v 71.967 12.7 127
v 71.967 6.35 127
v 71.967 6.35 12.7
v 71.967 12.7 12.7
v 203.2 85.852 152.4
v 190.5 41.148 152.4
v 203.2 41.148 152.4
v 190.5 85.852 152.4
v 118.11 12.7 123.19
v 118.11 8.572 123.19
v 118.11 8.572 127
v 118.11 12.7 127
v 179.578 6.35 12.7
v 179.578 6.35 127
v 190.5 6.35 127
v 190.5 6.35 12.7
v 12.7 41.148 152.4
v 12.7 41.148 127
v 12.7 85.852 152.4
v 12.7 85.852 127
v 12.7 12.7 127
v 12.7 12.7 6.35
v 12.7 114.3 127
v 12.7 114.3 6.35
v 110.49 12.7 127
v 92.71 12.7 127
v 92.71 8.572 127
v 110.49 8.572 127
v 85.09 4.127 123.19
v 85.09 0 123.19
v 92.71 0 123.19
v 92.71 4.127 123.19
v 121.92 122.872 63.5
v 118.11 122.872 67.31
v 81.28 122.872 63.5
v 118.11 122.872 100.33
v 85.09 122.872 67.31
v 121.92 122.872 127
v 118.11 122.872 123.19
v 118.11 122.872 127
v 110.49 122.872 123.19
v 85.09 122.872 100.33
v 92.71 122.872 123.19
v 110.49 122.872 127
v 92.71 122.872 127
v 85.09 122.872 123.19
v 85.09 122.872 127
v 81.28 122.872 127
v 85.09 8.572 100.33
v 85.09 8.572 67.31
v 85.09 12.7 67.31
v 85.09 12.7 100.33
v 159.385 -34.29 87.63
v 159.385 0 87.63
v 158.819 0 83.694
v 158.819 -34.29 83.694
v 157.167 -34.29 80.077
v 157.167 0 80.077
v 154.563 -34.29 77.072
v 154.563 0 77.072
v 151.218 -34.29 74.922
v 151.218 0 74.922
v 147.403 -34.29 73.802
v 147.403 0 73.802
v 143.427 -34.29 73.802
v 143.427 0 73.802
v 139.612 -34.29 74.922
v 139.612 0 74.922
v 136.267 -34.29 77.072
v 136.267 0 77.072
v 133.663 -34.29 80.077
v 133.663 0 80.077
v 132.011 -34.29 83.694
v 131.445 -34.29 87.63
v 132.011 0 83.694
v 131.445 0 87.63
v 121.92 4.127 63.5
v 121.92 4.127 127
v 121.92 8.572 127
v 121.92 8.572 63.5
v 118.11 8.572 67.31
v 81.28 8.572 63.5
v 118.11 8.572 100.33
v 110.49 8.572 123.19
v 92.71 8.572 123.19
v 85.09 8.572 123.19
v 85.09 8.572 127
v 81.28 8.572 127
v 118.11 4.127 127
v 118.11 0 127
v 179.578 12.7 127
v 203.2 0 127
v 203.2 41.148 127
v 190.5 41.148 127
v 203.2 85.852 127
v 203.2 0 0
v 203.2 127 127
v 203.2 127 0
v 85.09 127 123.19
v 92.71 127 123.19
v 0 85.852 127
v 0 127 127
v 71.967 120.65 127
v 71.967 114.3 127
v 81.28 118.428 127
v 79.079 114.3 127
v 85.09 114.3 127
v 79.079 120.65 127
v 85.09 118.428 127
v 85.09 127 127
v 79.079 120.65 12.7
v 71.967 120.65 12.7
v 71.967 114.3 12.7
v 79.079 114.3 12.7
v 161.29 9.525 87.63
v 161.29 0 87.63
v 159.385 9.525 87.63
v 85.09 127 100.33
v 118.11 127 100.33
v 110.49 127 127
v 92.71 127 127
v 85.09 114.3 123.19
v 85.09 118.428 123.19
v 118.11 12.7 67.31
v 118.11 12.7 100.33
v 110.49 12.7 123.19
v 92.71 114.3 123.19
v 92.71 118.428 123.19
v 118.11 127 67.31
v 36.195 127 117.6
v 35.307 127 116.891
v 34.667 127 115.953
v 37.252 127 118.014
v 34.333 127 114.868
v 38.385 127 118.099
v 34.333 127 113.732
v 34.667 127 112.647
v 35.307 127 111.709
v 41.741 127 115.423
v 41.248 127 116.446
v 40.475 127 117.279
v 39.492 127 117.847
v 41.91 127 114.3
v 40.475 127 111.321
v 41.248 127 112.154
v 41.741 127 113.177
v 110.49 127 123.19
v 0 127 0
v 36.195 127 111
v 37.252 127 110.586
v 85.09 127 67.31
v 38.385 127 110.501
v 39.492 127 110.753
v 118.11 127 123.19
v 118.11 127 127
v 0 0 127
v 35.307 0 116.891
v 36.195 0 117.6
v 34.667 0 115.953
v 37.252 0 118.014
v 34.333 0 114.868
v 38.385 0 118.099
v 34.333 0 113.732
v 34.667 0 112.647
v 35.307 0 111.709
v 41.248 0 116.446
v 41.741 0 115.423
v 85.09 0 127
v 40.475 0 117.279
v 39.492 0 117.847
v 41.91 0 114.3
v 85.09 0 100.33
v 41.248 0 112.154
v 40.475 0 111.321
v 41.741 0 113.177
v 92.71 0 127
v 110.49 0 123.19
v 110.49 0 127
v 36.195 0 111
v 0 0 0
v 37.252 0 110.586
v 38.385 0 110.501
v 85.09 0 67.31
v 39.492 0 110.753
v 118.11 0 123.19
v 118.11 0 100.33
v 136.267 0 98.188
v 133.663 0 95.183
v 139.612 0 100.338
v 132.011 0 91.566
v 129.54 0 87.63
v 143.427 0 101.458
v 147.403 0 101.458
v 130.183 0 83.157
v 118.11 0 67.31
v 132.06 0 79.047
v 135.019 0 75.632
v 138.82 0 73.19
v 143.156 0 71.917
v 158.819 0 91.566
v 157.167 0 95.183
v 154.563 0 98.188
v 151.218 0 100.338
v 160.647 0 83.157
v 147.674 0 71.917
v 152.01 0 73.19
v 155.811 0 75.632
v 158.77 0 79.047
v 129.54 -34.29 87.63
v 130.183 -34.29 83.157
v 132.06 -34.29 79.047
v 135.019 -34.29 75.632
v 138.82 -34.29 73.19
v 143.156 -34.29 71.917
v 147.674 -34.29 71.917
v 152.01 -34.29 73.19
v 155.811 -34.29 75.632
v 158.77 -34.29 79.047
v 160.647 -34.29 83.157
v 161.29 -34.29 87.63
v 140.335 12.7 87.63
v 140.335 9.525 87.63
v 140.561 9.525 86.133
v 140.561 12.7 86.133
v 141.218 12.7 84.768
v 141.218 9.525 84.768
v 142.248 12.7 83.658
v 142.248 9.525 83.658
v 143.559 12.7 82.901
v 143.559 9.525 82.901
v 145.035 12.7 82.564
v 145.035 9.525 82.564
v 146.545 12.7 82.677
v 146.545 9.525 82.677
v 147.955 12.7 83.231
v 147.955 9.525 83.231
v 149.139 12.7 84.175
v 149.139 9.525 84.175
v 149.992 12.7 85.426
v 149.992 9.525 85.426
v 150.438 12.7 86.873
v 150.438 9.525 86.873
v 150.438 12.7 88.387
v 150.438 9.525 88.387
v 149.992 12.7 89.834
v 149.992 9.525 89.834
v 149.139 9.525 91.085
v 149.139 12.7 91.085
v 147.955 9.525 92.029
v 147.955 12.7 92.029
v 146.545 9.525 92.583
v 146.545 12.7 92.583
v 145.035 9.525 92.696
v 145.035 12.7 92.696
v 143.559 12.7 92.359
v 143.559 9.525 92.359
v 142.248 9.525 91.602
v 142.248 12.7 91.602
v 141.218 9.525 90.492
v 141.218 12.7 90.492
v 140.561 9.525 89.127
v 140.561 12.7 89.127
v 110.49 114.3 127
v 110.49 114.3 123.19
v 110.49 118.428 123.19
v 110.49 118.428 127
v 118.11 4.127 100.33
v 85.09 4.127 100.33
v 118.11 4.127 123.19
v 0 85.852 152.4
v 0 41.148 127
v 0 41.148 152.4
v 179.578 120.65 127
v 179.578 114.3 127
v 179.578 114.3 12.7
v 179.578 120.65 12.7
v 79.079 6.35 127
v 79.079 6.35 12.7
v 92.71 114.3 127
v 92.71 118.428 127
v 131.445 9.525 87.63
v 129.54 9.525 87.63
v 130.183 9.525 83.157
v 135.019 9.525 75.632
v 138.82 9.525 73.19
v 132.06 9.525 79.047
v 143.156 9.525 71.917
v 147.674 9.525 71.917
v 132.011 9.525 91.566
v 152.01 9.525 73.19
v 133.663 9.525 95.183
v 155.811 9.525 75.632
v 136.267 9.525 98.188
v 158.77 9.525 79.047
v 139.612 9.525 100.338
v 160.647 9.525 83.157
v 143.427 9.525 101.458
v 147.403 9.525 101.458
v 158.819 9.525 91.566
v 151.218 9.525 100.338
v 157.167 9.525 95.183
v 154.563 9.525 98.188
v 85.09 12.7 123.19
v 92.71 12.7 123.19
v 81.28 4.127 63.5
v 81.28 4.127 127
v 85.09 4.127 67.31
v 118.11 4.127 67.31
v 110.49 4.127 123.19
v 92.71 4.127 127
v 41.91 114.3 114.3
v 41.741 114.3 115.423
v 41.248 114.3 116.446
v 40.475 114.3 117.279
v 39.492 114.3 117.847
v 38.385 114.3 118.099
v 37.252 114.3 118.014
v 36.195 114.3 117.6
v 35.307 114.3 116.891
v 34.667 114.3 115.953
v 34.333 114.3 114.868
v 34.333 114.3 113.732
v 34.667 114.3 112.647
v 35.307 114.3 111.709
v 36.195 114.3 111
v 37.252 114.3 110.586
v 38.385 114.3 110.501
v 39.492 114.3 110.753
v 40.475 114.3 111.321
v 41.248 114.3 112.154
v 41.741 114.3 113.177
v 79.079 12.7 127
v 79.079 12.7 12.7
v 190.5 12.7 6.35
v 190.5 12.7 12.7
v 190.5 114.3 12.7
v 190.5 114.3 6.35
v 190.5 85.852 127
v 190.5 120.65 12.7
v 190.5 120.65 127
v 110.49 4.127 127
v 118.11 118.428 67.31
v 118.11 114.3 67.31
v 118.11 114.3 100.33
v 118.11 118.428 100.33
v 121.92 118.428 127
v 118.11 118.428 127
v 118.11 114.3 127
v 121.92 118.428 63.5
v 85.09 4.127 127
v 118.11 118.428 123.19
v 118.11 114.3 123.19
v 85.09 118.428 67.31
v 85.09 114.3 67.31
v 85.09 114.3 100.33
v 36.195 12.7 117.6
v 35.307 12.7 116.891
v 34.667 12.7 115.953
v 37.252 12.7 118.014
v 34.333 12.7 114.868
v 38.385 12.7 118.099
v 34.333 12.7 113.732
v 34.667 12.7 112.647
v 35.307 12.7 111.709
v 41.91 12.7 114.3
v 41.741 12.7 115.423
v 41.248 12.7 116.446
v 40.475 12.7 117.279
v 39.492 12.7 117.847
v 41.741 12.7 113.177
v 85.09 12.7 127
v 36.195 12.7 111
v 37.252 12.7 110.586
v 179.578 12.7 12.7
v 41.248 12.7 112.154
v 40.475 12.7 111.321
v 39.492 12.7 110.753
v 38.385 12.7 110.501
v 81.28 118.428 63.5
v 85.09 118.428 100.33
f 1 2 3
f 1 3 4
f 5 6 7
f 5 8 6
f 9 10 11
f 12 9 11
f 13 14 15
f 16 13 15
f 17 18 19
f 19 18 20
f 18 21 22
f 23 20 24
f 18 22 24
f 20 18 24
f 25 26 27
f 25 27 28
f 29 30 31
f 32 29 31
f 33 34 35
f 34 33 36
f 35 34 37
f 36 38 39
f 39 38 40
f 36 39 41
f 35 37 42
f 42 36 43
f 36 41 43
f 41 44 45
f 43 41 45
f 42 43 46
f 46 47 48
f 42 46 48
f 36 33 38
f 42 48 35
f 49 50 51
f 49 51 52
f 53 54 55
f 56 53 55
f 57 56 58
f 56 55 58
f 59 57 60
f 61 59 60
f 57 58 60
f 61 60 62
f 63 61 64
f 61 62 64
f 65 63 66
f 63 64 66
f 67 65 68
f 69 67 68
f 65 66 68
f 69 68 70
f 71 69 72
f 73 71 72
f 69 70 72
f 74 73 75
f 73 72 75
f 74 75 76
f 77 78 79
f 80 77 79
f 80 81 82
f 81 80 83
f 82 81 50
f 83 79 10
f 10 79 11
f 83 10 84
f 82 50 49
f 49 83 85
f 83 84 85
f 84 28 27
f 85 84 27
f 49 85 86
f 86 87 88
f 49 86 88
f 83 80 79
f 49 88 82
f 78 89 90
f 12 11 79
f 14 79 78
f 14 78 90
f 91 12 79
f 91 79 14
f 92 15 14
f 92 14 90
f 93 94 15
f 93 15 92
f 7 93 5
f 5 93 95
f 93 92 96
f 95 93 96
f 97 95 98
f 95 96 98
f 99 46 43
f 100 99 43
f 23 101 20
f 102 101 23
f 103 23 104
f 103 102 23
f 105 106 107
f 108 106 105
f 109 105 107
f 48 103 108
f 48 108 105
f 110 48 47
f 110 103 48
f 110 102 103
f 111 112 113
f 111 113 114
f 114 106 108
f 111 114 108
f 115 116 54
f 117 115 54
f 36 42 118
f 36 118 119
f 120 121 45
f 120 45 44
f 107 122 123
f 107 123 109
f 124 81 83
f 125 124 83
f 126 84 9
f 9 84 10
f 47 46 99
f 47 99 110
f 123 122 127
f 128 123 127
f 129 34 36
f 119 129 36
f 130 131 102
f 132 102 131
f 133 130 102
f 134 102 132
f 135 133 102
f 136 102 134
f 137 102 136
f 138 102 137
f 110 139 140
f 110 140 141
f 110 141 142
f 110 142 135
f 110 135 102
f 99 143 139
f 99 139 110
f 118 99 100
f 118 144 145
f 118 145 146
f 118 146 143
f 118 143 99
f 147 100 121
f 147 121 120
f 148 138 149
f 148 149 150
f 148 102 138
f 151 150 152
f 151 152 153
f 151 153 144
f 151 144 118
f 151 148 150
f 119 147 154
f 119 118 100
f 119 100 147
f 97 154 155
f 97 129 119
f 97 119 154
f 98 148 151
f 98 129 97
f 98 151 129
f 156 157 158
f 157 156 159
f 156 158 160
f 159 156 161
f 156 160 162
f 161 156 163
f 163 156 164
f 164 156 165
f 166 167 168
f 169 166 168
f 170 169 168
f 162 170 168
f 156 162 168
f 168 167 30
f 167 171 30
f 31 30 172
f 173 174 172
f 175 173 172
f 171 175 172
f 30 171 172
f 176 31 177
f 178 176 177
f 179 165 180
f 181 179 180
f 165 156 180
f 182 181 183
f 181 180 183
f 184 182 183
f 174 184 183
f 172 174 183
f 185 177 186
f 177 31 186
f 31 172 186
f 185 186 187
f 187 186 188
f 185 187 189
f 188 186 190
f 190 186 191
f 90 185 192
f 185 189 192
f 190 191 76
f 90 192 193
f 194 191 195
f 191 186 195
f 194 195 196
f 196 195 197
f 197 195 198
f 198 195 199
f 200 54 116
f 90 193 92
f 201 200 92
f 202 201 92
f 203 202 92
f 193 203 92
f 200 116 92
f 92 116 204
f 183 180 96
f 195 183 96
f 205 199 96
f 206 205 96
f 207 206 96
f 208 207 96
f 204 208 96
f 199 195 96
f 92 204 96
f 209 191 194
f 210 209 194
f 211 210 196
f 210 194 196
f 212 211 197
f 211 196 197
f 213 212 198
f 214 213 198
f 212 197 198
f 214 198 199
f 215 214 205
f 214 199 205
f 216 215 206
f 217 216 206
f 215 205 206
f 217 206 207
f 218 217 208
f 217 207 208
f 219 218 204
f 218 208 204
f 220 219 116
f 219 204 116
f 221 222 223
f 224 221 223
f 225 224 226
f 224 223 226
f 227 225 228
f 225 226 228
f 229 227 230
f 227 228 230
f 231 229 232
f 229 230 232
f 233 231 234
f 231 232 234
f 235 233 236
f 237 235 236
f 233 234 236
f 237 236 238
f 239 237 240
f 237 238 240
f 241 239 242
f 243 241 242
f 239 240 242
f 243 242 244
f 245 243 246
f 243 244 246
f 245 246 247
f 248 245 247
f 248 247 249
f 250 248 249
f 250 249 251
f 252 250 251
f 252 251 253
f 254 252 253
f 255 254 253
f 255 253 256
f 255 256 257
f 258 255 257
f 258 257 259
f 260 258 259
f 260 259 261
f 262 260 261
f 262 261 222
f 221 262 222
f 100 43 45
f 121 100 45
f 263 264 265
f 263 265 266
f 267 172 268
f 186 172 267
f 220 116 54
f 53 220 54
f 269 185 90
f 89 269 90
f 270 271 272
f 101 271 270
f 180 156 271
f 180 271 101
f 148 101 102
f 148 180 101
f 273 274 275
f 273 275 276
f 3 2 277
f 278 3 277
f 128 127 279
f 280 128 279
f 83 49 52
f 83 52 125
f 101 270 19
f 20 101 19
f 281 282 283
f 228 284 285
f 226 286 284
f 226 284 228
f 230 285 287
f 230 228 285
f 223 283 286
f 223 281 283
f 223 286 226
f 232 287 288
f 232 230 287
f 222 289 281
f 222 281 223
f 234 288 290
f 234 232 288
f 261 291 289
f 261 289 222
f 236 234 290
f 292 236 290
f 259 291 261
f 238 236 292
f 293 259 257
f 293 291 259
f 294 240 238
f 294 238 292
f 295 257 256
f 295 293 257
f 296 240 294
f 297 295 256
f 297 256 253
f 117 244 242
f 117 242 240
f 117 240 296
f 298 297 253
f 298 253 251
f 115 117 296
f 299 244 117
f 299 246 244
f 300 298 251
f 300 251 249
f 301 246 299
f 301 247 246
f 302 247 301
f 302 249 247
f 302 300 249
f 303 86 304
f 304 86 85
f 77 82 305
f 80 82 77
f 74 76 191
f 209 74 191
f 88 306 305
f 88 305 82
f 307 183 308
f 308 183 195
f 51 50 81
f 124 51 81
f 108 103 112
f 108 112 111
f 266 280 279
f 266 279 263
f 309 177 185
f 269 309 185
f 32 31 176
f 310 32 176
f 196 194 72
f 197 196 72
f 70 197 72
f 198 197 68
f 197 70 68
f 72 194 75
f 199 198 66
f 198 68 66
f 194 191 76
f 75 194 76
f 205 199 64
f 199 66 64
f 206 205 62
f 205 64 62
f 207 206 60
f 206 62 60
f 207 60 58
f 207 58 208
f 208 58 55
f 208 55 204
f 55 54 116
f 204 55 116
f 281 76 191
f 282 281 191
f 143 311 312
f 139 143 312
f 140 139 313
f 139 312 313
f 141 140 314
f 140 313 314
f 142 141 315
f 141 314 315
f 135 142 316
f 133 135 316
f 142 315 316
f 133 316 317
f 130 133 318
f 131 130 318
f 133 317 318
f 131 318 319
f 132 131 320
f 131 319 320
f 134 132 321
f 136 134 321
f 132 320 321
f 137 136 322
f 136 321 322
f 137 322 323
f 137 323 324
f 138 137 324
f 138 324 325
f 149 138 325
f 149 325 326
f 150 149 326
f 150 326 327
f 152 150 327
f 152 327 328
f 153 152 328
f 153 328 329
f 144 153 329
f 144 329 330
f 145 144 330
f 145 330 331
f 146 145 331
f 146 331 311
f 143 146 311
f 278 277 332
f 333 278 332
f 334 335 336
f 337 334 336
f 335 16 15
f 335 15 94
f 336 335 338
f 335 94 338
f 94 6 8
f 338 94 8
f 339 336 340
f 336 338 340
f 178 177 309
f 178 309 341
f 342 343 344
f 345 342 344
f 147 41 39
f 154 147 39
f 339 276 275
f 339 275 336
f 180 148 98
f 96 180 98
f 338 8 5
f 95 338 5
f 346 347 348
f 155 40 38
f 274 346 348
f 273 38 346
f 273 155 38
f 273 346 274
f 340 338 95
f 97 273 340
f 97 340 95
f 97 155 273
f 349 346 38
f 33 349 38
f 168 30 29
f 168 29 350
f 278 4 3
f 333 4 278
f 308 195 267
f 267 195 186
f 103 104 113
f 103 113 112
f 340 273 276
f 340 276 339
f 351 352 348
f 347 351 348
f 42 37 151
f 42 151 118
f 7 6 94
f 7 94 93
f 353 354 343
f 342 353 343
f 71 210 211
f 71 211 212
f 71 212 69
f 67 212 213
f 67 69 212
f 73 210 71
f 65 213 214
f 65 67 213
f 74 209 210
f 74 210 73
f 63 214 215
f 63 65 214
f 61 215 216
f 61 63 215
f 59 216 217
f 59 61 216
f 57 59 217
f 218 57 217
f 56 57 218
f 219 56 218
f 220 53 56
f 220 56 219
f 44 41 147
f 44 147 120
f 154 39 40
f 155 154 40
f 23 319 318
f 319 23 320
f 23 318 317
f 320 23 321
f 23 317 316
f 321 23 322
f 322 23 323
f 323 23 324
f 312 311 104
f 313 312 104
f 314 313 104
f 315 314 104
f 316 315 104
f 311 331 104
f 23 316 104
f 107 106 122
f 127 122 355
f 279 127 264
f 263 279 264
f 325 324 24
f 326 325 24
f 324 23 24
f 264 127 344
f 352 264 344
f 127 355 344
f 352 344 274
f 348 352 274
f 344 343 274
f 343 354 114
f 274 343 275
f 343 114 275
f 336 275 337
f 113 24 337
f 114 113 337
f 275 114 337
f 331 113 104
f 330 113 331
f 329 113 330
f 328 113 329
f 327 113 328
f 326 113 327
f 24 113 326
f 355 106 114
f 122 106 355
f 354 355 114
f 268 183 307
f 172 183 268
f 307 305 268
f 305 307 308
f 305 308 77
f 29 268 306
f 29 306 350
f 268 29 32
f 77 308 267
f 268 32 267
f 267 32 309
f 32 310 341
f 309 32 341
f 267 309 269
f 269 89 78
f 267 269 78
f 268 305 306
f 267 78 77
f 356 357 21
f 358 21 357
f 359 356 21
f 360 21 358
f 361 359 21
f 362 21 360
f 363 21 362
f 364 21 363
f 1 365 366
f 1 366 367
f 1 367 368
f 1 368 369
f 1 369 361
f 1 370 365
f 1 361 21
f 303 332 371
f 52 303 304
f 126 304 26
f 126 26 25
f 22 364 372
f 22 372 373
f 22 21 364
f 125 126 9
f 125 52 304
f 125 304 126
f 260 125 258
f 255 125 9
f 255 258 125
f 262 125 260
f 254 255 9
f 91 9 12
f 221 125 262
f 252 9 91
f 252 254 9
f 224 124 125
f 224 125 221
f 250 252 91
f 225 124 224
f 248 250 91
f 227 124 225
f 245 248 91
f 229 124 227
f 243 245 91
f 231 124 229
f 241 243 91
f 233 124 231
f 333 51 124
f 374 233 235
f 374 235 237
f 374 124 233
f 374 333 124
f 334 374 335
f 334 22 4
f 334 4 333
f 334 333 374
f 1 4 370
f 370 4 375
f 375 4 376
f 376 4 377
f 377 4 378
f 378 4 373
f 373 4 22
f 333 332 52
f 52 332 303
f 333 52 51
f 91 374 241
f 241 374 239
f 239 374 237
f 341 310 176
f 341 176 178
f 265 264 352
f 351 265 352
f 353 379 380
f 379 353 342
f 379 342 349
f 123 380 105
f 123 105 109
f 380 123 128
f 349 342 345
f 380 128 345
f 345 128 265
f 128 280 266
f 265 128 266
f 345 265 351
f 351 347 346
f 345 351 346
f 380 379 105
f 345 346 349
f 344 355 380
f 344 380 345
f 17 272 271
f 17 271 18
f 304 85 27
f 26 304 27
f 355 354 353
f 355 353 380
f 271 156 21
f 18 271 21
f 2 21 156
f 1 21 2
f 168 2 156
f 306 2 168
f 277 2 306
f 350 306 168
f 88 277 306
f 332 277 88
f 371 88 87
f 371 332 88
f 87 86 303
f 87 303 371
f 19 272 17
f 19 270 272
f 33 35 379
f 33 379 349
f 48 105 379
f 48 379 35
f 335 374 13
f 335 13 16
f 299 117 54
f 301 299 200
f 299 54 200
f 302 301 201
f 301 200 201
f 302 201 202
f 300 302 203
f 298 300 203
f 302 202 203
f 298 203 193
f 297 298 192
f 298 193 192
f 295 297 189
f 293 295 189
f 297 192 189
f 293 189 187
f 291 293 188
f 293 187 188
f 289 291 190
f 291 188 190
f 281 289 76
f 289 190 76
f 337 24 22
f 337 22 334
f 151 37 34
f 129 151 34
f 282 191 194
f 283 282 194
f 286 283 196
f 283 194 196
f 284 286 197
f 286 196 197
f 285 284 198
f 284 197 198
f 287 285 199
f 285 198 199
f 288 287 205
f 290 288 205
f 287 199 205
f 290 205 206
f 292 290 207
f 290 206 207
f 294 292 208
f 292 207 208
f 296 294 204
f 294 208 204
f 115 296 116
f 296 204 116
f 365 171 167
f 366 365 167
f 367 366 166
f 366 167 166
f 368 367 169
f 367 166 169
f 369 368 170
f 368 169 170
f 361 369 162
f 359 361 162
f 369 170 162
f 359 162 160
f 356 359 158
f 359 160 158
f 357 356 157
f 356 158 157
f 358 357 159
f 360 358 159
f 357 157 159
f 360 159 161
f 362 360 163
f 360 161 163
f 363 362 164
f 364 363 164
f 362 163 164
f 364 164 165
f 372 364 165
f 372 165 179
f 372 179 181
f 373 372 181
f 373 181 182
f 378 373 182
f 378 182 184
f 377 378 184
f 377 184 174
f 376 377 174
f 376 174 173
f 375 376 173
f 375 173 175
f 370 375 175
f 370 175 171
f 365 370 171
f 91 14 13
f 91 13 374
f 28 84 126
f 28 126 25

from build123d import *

# Parameters (mm, degrees)
F6_W      = 203.2
F6_H      = 127
F6_W_2    = 177.8
F6_H_2    = 101.6
F7_DEPTH  = 127
F8_DEPTH  = 6.35
F9_W      = 20.32
F9_H      = 4.445
F10_DEPTH = 63.5
F11_W     = 33.02
F11_H     = 33.02
F11_W_2   = 7.62
F11_H_2   = 3.81
F12_DEPTH = 127
F13_DEPTH = 12.7
F14_DEPTH = 9.525
F15_DEPTH = 34.29
F16_W     = 10.922
F16_H     = 6.35
F16_W_2   = 7.112
F17_DEPTH = 114.3
F18_W     = 12.7
F18_H     = 22.352
F19_DEPTH = 25.4
F20_R     = 3.81
F21_DEPTH = 127


# Not quite as in the source:
# - a variable given as a bare number and used for a length is read in inches; the dataset says mm whatever the document's units were


with BuildPart() as f7:
    # F6 (on Top) → F7 (new body)
    with BuildSketch(Plane.XY):
        with Locations((101.6, 63.5)):
            Rectangle(F6_W, F6_H)
        with Locations((101.6, 63.5)):
            Rectangle(F6_W_2, F6_H_2, mode=Mode.SUBTRACT)
    extrude(amount=F7_DEPTH)

    # F6 (on Top) → F8 (join)
    with BuildSketch(Plane.XY):
        with Locations((101.6, 63.5)):
            Rectangle(F6_W_2, F6_H_2)
    extrude(amount=F8_DEPTH)

    # F9 (on face) → F10 (cut)
    with BuildSketch(Plane.XY.offset(127)):
        with Locations((91.44, 6.35)):
            Rectangle(F9_W, F9_H)
        with Locations((111.76, 6.35)):
            Rectangle(F9_W, F9_H)
        with Locations((91.44, 120.65)):
            Rectangle(F9_W, F9_H)
        with Locations((111.76, 120.65)):
            Rectangle(F9_W, F9_H)
    extrude(amount=-F10_DEPTH, mode=Mode.SUBTRACT)

    # F11 (on face) → F12 (cut)
    with BuildSketch(Plane.XZ):
        with Locations((101.6, 83.82)):
            Rectangle(F11_W, F11_H)
        with Locations((88.9, 125.095)):
            Rectangle(F11_W_2, F11_H_2)
        with Locations((114.3, 125.095)):
            Rectangle(F11_W_2, F11_H_2)
    extrude(amount=-F12_DEPTH, mode=Mode.SUBTRACT)

    # F11 (on face) → F13 (cut)
    with BuildSketch(Plane.XZ):
        with BuildLine():
            Line((145.415, 87.63), (150.495, 87.63))
            ThreePointArc((150.495, 87.63), (145.415, 92.71), (140.335, 87.63))
            Line((140.335, 87.63), (145.415, 87.63))
        make_face()
        with BuildLine():
            ThreePointArc((140.335, 87.63), (145.415, 82.55), (150.495, 87.63))
            Line((150.495, 87.63), (145.415, 87.63))
            Line((145.415, 87.63), (140.335, 87.63))
        make_face()
    extrude(amount=-F13_DEPTH, mode=Mode.SUBTRACT)

    # F11 (on face) → F14 (cut)
    with BuildSketch(Plane.XZ):
        with BuildLine():
            Line((161.29, 87.63), (159.385, 87.63))
            ThreePointArc((159.385, 87.63), (145.415, 73.66), (131.445, 87.63))
            Line((131.445, 87.63), (129.54, 87.63))
            ThreePointArc((129.54, 87.63), (145.415, 71.755), (161.29, 87.63))
        make_face()
        with BuildLine():
            ThreePointArc((131.445, 87.63), (145.415, 73.66), (159.385, 87.63))
            Line((159.385, 87.63), (150.495, 87.63))
            ThreePointArc((150.495, 87.63), (145.415, 82.55), (140.335, 87.63))
            Line((140.335, 87.63), (131.445, 87.63))
        make_face()
        with BuildLine():
            Line((150.495, 87.63), (159.385, 87.63))
            ThreePointArc((159.385, 87.63), (145.415, 101.6), (131.445, 87.63))
            Line((131.445, 87.63), (140.335, 87.63))
            ThreePointArc((140.335, 87.63), (145.415, 92.71), (150.495, 87.63))
        make_face()
    extrude(amount=-F14_DEPTH, mode=Mode.SUBTRACT)

    # F16 (on face) → F17 (cut)
    with BuildSketch(Plane.XY.offset(127)):
        with Locations((185.039, 9.525)):
            Rectangle(F16_W, F16_H)
        with Locations((75.5226666667, 9.525)):
            Rectangle(F16_W_2, F16_H)
        with Locations((185.039, 117.475)):
            Rectangle(F16_W, F16_H)
        with Locations((75.5226666667, 117.475)):
            Rectangle(F16_W_2, F16_H)
    extrude(amount=-F17_DEPTH, mode=Mode.SUBTRACT)

    # F18 (on face) → F19 (join)
    with BuildSketch(Plane.XY.offset(127)):
        with Locations((6.35, 52.324)):
            Rectangle(F18_W, F18_H)
        with Locations((196.85, 52.324)):
            Rectangle(F18_W, F18_H)
        with Locations((196.85, 74.676)):
            Rectangle(F18_W, F18_H)
        with Locations((6.35, 74.676)):
            Rectangle(F18_W, F18_H)
    extrude(amount=F19_DEPTH)

    # F20 (on face) → F21 (cut)
    with BuildSketch(Plane.XZ):
        with Locations((38.1, 114.3)):
            Circle(F20_R)
    extrude(amount=-F21_DEPTH, mode=Mode.SUBTRACT)


with BuildPart() as f15:
    # F11 (on face) → F15 (new body)
    with BuildSketch(Plane.XZ):
        with BuildLine():
            Line((161.29, 87.63), (159.385, 87.63))
            ThreePointArc((159.385, 87.63), (145.415, 73.66), (131.445, 87.63))
            Line((131.445, 87.63), (129.54, 87.63))
            ThreePointArc((129.54, 87.63), (145.415, 71.755), (161.29, 87.63))
        make_face()
    extrude(amount=F15_DEPTH)


solid = Compound([f7.part, f15.part])
